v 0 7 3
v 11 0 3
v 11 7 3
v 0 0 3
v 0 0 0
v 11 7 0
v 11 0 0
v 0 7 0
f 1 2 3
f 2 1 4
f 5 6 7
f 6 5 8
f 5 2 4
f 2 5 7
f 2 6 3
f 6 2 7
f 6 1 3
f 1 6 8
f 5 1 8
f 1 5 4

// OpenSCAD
// Generated by SolidPython 1.0.1 on 2020-07-29 00:46:55


cube(size = [11, 7, 3]);
/***********************************************
*********      SolidPython code:      **********
************************************************
 
# import packages: SolidPython
from solid import *
from solid.utils import *
from itertools import chain, combinations, permutations


class Resize:

    def __init__(self, scad_file):
        self.scad_file = scad_file
        #self.scad_file = import_scad(scad_file)
        # cone/cylinder param:
        self.r1 = 0
        self.r2 = 0
        self.h = 0
        # rectangular prism param:
        self.w = 0
        self.l = 0
        # ellipse param:
        self.r = 0

    # import OpenScad code (file name corresponds to shape)


    # classify shape + parameters
    def assign(self, param1, param2, param3):
        if self.scad_file == 'cone.scad':
            self.r1 = param1
            self.r2 = param2
            self.h = param3
        elif self.scad_file == 'cylinder.scad':
            self.r1 = param1
            self.r2 = param2
            self.h = param3
        elif self.scad_file == 'rectangularPrism.scad':
            self.h = param1
            self.l = param2
            self.w = param3
        else:
            self.r = param1
            self.h = param2

    # resize parameters
    def iterate(self):
        x = range(3, 20, 2)
        i = 1
        if self.scad_file == 'cone.scad':
            tempList = list(permutations(x, 2))
            for temp in tempList:
                param1 = temp[0]
                param2 = temp[1]
                filepath = 'produced_scad_files/' + 'cone' + str(param1) + '_' + str(param2) + '_' + '.scad'
                scad_render_to_file(cylinder(h=param1, r1=param2, r2=0), filepath)

        elif self.scad_file == 'cylinder.scad':
            tempList = list(permutations(x, 3))
            for temp in tempList:
                param1 = temp[0]
                param2 = temp[1]
                filepath = 'produced_scad_files/' + 'cylinder' + str(param1) + '_' + str(param2) + '_' + '.scad'
                scad_render_to_file(cylinder(h=param1, r1=param2, r2=param2), filepath)

        elif self.scad_file == 'rectangularPrism.scad':
            tempList = list(permutations(x, 3))
            for temp in tempList:
                param1 = temp[0]
                param2 = temp[1]
                param3 = temp[2]
                filepath = 'produced_scad_files/' + 'rectangularPrism' + str(param1) + '_' + str(param2) + '_' + str(
                    param3) + '.scad'
                scad_render_to_file(cube(size=(param1, param2, param3)), filepath)

        elif self.scad_file == 'ellipse.scad':
            tempList = list(permutations(x, 4))
            for temp in tempList:
                param1 = temp[0]
                param2 = temp[1]
                param3 = temp[2]
                param4 = temp[3]
                filepath = 'produced_scad_files/' + 'ellipse' + str(param1) + '_' + str(param2) + '_' + str(param3) + '_' + str(param4) + '.scad'
                scad_render_to_file(scale([param1, param2, param3])(sphere(r=param4)), filepath)

    def render_to_scadfile(self):
        scad_render_to_file(scad, 'example.scad') 
 
************************************************/
